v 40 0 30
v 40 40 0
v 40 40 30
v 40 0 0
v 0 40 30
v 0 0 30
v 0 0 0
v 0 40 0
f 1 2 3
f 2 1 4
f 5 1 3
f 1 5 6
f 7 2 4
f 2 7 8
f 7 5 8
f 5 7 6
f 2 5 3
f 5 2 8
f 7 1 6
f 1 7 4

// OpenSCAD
// Parameters
block_width = 40;
block_depth = 40;
block_height = 30;

pyramid_base = 15;
pyramid_height = 10;
pyramid_spacing = 5;

// Module to create a square pyramid
module square_pyramid(base, height) {
    polyhedron(
        points=[
            [0, 0, 0],                // base corner 1
            [base, 0, 0],             // base corner 2
            [base, base, 0],          // base corner 3
            [0, base, 0],             // base corner 4
            [base/2, base/2, height]  // apex
        ],
        faces=[
            [0, 1, 4],
            [1, 2, 4],
            [2, 3, 4],
            [3, 0, 4],
            [0, 1, 2, 3]
        ]
    );
}

// Main block with pyramidal recesses
difference() {
    // Solid block
    cube([block_width, block_depth, block_height]);

    // Pyramidal recesses
    for (x = [0, 1])
        for (y = [0, 1])
            translate([
                x * (pyramid_base + pyramid_spacing) + pyramid_spacing,
                y * (pyramid_base + pyramid_spacing) + pyramid_spacing,
                block_height - 0.01  // Slight offset to ensure clean subtraction
            ])
            rotate([0, 0, 0])
            mirror([0, 0, 1])  // Invert pyramid to make it a recess
            square_pyramid(pyramid_base, pyramid_height);
}
